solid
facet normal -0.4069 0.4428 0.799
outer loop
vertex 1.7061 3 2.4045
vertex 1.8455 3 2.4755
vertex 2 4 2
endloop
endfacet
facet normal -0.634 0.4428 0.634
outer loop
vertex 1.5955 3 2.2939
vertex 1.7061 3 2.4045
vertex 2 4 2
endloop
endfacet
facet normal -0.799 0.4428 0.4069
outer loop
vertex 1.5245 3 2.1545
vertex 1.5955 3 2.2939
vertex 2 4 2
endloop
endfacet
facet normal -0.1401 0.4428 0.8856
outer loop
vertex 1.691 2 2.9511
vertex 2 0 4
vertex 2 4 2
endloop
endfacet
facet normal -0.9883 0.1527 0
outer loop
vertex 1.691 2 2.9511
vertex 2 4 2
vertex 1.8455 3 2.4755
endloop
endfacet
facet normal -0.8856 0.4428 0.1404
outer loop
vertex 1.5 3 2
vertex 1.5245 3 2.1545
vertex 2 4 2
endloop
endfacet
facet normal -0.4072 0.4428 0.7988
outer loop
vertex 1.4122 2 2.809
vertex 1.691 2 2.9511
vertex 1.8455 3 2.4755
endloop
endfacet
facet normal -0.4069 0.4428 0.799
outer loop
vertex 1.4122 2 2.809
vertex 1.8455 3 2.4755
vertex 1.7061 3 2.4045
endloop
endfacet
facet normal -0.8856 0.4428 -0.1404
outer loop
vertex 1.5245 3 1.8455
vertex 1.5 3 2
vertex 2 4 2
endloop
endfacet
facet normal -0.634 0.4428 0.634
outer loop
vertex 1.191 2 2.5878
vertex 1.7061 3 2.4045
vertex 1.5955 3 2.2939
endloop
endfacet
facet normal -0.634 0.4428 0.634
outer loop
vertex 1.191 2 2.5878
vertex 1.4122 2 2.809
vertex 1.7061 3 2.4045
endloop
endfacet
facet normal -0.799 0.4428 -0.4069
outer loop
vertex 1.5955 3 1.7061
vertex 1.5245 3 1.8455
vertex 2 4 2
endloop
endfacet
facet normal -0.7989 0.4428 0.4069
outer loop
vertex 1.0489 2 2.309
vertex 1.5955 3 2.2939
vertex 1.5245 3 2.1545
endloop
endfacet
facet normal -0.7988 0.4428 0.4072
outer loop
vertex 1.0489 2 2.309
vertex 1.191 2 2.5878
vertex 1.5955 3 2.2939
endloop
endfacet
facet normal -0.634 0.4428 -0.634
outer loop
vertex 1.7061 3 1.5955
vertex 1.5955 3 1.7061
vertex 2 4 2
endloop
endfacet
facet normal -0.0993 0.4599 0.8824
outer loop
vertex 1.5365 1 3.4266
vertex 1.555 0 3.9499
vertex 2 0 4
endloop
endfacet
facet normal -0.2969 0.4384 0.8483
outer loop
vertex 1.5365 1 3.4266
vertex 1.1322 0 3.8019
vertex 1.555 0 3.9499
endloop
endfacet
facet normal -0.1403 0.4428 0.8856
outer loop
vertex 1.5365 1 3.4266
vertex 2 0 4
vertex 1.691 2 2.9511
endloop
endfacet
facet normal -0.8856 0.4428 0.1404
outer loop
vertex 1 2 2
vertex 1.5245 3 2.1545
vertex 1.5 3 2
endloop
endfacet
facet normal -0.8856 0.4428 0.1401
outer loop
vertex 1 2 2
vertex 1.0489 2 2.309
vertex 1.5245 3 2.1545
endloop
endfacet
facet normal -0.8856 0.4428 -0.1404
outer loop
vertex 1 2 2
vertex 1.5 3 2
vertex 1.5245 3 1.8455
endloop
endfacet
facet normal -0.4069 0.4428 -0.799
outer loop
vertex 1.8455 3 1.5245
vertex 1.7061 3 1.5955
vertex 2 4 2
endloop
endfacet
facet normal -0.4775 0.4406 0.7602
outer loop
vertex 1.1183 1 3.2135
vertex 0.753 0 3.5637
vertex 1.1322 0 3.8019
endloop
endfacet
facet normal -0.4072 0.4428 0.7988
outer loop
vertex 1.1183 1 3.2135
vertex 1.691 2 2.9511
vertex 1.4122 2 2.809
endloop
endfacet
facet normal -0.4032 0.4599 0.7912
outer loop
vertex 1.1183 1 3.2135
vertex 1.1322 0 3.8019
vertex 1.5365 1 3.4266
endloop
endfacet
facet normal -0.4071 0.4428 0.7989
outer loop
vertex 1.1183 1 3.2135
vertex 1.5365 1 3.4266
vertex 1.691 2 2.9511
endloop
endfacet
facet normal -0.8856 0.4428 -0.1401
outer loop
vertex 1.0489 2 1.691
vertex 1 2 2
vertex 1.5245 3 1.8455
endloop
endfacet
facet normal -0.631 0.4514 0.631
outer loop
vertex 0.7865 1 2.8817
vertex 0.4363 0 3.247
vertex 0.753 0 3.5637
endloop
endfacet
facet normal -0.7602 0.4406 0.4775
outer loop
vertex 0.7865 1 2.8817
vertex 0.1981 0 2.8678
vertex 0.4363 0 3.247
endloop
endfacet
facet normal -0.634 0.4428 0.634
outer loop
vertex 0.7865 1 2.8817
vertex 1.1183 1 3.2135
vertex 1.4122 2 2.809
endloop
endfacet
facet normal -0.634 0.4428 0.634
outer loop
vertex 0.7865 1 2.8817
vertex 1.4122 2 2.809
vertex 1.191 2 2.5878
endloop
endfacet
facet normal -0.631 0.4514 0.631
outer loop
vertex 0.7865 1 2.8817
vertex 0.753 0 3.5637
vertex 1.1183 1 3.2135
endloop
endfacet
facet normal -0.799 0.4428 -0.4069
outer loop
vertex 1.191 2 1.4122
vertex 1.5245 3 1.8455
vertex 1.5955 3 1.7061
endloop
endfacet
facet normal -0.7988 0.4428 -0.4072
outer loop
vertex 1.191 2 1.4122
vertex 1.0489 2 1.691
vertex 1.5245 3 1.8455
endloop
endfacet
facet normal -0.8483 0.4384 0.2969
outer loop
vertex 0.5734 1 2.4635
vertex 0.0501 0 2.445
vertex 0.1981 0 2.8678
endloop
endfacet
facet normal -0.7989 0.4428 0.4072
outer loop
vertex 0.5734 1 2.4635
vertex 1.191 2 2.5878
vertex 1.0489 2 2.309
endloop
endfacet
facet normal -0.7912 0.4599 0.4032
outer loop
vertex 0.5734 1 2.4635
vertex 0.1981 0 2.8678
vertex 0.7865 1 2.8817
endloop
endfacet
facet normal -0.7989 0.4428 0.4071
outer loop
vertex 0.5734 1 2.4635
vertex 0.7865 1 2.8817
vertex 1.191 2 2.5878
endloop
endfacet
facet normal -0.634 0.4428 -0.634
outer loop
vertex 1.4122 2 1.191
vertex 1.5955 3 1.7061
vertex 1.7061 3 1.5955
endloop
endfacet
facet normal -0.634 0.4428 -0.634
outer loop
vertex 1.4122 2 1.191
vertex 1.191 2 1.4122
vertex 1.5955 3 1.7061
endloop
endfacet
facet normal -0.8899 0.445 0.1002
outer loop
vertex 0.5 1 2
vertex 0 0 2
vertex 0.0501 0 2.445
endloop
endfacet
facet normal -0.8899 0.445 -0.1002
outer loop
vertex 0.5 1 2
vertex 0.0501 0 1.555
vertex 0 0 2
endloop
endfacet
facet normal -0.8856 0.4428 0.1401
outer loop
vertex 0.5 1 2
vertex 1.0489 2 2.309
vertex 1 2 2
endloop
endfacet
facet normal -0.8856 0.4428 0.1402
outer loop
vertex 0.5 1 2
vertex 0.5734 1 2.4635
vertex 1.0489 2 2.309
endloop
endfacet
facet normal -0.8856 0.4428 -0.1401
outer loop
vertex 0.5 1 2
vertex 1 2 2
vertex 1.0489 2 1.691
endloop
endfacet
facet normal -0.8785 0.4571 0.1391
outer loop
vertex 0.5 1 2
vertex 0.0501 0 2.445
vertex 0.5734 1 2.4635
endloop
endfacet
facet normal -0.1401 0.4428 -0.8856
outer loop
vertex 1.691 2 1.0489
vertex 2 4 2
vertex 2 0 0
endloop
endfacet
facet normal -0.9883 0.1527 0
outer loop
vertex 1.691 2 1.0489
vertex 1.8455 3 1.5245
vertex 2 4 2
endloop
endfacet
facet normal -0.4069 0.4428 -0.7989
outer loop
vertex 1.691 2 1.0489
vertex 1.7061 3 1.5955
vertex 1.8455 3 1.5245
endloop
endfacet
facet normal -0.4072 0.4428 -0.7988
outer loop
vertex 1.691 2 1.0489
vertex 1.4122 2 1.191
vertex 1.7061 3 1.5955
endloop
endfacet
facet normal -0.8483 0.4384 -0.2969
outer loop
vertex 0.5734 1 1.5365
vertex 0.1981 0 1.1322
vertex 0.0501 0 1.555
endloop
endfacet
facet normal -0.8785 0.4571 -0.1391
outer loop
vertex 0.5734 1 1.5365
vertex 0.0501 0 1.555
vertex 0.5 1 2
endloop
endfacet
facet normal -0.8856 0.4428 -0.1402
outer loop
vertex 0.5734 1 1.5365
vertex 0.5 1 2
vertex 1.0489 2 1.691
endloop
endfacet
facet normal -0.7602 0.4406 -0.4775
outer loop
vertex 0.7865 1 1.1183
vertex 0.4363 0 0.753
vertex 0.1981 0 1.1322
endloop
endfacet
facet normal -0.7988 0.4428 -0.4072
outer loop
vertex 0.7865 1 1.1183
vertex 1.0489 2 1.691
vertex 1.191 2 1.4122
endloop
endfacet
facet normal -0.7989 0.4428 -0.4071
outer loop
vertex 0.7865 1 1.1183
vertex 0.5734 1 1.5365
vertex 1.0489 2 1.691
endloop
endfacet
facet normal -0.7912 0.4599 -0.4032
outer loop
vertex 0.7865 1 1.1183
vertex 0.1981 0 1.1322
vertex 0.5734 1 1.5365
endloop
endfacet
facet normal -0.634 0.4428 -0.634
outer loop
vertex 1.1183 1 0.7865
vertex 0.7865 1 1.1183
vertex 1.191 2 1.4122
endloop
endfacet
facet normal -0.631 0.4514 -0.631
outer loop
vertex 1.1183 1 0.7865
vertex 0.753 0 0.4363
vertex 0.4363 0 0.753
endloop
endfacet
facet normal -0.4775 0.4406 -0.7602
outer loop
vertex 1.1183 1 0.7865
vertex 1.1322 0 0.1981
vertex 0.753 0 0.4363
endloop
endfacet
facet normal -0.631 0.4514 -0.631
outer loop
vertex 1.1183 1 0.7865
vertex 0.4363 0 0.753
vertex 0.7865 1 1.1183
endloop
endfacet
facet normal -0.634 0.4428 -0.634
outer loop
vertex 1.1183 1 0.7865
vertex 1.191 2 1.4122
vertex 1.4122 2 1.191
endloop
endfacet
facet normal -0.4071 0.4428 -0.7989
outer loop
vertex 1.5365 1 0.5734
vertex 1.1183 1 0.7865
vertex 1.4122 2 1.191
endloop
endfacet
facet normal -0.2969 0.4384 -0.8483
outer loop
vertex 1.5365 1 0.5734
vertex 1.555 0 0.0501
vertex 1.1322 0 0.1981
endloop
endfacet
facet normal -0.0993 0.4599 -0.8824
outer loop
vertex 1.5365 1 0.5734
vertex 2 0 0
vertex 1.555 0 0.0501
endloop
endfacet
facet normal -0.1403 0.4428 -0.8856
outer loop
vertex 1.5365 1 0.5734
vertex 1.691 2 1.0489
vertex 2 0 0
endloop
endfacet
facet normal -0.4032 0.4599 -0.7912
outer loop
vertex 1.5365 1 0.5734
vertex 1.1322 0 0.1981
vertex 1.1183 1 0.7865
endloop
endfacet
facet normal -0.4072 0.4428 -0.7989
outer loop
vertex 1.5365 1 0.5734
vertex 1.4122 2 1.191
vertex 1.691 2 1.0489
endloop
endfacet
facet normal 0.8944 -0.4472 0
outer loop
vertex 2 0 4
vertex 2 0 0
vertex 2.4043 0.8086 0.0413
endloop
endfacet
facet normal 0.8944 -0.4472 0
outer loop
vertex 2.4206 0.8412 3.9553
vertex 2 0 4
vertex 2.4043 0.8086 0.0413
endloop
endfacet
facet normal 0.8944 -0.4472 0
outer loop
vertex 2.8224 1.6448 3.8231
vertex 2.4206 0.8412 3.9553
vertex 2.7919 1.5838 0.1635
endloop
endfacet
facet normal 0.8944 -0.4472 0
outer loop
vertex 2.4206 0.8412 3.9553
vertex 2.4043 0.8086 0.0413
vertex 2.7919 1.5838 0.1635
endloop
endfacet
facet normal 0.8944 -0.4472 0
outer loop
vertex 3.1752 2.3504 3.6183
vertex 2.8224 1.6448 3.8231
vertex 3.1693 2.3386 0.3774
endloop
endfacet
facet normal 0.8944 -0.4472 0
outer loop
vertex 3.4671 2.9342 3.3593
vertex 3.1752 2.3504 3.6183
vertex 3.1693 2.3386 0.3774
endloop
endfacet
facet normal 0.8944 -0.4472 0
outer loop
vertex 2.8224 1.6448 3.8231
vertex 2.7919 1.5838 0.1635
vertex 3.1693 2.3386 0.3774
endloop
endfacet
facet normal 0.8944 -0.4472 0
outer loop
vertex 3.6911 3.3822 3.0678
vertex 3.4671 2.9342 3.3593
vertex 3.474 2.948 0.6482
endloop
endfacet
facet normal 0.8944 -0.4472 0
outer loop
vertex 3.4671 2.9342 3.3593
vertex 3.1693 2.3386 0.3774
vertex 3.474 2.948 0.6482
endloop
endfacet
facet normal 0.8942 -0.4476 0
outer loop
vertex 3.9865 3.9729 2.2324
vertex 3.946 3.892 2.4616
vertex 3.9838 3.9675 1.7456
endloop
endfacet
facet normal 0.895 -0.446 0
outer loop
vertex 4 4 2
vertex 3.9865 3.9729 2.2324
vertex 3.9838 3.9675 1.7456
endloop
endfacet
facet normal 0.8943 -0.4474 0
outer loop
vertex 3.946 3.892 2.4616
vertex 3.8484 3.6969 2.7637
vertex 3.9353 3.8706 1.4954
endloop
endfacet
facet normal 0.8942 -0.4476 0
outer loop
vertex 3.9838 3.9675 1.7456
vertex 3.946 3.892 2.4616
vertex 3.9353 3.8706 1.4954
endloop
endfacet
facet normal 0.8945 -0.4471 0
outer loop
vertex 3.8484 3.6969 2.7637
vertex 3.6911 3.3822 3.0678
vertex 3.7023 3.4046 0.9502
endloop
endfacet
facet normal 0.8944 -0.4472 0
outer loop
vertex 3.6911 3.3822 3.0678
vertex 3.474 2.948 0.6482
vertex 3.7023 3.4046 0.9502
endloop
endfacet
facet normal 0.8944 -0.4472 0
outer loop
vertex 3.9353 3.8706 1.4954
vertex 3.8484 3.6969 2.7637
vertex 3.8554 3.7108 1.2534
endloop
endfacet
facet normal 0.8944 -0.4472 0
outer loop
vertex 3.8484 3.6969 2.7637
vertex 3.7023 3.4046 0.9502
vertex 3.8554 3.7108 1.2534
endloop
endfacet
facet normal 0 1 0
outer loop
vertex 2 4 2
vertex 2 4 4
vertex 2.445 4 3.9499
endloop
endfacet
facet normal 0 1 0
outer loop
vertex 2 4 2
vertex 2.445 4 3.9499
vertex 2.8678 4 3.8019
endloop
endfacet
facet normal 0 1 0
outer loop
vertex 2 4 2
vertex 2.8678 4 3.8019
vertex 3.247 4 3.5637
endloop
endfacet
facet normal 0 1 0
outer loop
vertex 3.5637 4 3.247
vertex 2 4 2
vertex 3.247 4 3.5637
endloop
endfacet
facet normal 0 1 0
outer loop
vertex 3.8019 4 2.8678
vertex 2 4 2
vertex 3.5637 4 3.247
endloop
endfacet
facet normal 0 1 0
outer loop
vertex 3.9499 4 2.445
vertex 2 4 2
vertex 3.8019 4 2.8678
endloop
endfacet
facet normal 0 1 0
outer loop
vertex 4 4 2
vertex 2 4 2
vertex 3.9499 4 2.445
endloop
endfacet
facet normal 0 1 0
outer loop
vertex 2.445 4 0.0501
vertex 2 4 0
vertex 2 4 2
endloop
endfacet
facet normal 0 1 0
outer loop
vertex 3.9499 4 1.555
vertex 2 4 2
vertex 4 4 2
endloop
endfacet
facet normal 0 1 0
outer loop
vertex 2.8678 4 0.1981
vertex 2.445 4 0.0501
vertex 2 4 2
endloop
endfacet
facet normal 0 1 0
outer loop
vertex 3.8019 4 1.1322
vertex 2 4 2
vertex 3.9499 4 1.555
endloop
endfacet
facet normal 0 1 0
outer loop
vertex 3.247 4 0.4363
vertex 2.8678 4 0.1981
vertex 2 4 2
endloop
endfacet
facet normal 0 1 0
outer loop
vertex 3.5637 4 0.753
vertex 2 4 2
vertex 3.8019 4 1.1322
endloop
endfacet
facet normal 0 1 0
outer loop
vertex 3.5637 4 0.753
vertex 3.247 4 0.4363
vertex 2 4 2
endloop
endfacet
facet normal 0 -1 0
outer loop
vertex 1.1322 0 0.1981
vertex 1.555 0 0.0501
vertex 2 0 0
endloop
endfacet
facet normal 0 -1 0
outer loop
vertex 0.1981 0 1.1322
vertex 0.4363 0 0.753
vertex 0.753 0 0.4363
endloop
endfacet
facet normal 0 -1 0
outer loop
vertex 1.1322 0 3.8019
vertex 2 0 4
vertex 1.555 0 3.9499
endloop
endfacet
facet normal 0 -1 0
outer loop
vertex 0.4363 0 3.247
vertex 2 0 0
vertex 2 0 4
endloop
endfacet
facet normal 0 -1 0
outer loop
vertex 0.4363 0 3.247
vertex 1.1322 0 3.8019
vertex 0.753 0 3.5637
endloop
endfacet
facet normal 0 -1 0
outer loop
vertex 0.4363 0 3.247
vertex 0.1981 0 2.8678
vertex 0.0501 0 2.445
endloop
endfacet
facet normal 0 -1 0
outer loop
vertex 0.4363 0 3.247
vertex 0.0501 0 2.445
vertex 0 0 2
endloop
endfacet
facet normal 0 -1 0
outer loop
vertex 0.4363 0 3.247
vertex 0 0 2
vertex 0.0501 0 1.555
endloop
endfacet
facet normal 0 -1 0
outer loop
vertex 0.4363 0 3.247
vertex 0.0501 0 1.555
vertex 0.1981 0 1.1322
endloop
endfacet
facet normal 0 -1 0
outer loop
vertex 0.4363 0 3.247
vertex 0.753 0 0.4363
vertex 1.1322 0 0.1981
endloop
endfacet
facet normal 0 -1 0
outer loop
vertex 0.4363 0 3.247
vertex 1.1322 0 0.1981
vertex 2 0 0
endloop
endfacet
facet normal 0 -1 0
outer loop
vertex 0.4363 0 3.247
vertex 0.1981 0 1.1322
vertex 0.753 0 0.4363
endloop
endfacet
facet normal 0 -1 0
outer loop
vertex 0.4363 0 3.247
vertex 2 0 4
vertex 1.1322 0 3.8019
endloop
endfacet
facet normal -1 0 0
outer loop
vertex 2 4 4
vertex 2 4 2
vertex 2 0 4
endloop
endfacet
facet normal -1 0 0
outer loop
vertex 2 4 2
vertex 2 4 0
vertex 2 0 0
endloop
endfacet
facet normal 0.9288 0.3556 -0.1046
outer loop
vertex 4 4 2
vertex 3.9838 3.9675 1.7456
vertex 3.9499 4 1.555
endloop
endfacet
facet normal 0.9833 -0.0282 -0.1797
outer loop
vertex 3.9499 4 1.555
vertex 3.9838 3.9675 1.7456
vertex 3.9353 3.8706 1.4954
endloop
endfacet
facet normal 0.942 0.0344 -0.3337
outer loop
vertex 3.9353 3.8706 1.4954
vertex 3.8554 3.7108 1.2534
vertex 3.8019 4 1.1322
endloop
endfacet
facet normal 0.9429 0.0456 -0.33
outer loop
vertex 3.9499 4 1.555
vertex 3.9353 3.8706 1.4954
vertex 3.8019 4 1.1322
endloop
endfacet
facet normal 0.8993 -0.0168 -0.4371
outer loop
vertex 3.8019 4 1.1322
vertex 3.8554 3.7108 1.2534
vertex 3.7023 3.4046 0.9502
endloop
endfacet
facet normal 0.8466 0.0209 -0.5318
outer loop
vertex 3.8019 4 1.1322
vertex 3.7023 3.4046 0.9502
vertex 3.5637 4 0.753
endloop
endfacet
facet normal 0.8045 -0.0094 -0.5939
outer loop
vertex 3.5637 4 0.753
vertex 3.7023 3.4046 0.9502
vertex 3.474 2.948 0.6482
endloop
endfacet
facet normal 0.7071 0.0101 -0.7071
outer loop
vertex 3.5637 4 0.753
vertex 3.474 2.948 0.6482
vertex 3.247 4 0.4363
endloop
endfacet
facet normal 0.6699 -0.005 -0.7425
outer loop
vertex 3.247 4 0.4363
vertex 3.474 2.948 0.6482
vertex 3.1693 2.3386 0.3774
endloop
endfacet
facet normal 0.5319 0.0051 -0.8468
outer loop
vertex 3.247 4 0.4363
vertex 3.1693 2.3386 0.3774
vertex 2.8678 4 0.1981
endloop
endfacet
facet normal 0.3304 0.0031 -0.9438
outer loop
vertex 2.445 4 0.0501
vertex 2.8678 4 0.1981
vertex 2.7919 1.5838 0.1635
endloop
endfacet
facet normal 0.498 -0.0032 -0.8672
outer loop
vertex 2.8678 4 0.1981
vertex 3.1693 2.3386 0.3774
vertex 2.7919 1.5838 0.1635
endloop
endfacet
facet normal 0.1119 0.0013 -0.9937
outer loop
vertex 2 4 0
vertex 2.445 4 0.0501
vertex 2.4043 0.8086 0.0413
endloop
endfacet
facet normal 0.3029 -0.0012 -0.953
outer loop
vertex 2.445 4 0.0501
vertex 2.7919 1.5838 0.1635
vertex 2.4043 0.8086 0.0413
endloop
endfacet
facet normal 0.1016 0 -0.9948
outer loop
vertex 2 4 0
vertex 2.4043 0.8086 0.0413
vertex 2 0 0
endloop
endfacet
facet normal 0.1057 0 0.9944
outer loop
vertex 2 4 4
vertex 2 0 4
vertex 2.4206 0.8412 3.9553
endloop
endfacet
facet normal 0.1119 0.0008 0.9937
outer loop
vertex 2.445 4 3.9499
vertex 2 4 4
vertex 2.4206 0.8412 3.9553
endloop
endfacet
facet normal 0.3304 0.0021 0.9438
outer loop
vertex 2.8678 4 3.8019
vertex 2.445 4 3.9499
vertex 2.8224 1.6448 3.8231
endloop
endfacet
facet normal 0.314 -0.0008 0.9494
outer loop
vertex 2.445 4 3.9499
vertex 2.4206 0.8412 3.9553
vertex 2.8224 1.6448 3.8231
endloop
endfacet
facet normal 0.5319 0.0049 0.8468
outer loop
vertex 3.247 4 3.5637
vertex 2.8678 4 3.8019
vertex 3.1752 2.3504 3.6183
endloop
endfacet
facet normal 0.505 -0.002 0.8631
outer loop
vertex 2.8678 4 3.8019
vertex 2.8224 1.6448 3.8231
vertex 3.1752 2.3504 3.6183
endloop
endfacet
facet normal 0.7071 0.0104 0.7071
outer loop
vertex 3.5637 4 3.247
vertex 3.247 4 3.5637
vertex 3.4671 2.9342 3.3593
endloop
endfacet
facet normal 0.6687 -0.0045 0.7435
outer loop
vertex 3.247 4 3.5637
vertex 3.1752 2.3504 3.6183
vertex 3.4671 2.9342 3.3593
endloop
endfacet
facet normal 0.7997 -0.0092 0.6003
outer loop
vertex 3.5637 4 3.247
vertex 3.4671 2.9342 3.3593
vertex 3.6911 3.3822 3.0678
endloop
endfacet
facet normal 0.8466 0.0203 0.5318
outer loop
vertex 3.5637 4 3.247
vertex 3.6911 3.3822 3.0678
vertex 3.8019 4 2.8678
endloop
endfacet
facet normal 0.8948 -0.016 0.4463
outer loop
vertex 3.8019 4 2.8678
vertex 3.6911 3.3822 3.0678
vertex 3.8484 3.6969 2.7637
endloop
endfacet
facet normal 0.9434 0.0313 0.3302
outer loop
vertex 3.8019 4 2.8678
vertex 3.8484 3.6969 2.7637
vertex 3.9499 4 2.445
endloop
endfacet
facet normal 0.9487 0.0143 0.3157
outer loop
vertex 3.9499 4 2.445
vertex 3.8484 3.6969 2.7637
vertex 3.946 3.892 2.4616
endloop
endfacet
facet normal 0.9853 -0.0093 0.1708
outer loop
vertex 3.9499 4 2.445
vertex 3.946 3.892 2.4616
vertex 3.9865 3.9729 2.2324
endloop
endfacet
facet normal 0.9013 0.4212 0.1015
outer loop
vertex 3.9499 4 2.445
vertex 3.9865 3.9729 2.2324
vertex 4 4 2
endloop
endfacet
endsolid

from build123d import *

# Parameters (mm, degrees)
BOSS_EXTRUDE1_DEPTH = 4
REVOLVE1_ANGLE      = 180
CUT_EXTRUDE4_DEPTH  = 4


with BuildPart() as part:
    # Sketch1 → Boss-Extrude1 (new body)
    with BuildSketch(Plane(origin=(0, 0, 0), x_dir=(1, 0, 0), z_dir=(0, 1, 0))):
        with BuildLine():
            Line((2, 0), (2, -4))
            ThreePointArc((2, -4), (4, -2), (2, 0))
        make_face()
    extrude(amount=BOSS_EXTRUDE1_DEPTH)

    # Sketch6 → Revolve1 (revolve)
    with BuildSketch(Plane.ZY.offset(-2)):
        Polygon((2, 0), (2, 4), (4, 0), align=None)
    revolve(axis=Axis((2, 0, 2), (0, -1, 0)), revolution_arc=REVOLVE1_ANGLE)

    # Sketch7 → Cut-Extrude4 (cut)
    with BuildSketch(Plane.XY):
        Polygon((4, 0), (2, 0), (4, 4), align=None)
    extrude(amount=CUT_EXTRUDE4_DEPTH, mode=Mode.SUBTRACT)


solid = part.part
